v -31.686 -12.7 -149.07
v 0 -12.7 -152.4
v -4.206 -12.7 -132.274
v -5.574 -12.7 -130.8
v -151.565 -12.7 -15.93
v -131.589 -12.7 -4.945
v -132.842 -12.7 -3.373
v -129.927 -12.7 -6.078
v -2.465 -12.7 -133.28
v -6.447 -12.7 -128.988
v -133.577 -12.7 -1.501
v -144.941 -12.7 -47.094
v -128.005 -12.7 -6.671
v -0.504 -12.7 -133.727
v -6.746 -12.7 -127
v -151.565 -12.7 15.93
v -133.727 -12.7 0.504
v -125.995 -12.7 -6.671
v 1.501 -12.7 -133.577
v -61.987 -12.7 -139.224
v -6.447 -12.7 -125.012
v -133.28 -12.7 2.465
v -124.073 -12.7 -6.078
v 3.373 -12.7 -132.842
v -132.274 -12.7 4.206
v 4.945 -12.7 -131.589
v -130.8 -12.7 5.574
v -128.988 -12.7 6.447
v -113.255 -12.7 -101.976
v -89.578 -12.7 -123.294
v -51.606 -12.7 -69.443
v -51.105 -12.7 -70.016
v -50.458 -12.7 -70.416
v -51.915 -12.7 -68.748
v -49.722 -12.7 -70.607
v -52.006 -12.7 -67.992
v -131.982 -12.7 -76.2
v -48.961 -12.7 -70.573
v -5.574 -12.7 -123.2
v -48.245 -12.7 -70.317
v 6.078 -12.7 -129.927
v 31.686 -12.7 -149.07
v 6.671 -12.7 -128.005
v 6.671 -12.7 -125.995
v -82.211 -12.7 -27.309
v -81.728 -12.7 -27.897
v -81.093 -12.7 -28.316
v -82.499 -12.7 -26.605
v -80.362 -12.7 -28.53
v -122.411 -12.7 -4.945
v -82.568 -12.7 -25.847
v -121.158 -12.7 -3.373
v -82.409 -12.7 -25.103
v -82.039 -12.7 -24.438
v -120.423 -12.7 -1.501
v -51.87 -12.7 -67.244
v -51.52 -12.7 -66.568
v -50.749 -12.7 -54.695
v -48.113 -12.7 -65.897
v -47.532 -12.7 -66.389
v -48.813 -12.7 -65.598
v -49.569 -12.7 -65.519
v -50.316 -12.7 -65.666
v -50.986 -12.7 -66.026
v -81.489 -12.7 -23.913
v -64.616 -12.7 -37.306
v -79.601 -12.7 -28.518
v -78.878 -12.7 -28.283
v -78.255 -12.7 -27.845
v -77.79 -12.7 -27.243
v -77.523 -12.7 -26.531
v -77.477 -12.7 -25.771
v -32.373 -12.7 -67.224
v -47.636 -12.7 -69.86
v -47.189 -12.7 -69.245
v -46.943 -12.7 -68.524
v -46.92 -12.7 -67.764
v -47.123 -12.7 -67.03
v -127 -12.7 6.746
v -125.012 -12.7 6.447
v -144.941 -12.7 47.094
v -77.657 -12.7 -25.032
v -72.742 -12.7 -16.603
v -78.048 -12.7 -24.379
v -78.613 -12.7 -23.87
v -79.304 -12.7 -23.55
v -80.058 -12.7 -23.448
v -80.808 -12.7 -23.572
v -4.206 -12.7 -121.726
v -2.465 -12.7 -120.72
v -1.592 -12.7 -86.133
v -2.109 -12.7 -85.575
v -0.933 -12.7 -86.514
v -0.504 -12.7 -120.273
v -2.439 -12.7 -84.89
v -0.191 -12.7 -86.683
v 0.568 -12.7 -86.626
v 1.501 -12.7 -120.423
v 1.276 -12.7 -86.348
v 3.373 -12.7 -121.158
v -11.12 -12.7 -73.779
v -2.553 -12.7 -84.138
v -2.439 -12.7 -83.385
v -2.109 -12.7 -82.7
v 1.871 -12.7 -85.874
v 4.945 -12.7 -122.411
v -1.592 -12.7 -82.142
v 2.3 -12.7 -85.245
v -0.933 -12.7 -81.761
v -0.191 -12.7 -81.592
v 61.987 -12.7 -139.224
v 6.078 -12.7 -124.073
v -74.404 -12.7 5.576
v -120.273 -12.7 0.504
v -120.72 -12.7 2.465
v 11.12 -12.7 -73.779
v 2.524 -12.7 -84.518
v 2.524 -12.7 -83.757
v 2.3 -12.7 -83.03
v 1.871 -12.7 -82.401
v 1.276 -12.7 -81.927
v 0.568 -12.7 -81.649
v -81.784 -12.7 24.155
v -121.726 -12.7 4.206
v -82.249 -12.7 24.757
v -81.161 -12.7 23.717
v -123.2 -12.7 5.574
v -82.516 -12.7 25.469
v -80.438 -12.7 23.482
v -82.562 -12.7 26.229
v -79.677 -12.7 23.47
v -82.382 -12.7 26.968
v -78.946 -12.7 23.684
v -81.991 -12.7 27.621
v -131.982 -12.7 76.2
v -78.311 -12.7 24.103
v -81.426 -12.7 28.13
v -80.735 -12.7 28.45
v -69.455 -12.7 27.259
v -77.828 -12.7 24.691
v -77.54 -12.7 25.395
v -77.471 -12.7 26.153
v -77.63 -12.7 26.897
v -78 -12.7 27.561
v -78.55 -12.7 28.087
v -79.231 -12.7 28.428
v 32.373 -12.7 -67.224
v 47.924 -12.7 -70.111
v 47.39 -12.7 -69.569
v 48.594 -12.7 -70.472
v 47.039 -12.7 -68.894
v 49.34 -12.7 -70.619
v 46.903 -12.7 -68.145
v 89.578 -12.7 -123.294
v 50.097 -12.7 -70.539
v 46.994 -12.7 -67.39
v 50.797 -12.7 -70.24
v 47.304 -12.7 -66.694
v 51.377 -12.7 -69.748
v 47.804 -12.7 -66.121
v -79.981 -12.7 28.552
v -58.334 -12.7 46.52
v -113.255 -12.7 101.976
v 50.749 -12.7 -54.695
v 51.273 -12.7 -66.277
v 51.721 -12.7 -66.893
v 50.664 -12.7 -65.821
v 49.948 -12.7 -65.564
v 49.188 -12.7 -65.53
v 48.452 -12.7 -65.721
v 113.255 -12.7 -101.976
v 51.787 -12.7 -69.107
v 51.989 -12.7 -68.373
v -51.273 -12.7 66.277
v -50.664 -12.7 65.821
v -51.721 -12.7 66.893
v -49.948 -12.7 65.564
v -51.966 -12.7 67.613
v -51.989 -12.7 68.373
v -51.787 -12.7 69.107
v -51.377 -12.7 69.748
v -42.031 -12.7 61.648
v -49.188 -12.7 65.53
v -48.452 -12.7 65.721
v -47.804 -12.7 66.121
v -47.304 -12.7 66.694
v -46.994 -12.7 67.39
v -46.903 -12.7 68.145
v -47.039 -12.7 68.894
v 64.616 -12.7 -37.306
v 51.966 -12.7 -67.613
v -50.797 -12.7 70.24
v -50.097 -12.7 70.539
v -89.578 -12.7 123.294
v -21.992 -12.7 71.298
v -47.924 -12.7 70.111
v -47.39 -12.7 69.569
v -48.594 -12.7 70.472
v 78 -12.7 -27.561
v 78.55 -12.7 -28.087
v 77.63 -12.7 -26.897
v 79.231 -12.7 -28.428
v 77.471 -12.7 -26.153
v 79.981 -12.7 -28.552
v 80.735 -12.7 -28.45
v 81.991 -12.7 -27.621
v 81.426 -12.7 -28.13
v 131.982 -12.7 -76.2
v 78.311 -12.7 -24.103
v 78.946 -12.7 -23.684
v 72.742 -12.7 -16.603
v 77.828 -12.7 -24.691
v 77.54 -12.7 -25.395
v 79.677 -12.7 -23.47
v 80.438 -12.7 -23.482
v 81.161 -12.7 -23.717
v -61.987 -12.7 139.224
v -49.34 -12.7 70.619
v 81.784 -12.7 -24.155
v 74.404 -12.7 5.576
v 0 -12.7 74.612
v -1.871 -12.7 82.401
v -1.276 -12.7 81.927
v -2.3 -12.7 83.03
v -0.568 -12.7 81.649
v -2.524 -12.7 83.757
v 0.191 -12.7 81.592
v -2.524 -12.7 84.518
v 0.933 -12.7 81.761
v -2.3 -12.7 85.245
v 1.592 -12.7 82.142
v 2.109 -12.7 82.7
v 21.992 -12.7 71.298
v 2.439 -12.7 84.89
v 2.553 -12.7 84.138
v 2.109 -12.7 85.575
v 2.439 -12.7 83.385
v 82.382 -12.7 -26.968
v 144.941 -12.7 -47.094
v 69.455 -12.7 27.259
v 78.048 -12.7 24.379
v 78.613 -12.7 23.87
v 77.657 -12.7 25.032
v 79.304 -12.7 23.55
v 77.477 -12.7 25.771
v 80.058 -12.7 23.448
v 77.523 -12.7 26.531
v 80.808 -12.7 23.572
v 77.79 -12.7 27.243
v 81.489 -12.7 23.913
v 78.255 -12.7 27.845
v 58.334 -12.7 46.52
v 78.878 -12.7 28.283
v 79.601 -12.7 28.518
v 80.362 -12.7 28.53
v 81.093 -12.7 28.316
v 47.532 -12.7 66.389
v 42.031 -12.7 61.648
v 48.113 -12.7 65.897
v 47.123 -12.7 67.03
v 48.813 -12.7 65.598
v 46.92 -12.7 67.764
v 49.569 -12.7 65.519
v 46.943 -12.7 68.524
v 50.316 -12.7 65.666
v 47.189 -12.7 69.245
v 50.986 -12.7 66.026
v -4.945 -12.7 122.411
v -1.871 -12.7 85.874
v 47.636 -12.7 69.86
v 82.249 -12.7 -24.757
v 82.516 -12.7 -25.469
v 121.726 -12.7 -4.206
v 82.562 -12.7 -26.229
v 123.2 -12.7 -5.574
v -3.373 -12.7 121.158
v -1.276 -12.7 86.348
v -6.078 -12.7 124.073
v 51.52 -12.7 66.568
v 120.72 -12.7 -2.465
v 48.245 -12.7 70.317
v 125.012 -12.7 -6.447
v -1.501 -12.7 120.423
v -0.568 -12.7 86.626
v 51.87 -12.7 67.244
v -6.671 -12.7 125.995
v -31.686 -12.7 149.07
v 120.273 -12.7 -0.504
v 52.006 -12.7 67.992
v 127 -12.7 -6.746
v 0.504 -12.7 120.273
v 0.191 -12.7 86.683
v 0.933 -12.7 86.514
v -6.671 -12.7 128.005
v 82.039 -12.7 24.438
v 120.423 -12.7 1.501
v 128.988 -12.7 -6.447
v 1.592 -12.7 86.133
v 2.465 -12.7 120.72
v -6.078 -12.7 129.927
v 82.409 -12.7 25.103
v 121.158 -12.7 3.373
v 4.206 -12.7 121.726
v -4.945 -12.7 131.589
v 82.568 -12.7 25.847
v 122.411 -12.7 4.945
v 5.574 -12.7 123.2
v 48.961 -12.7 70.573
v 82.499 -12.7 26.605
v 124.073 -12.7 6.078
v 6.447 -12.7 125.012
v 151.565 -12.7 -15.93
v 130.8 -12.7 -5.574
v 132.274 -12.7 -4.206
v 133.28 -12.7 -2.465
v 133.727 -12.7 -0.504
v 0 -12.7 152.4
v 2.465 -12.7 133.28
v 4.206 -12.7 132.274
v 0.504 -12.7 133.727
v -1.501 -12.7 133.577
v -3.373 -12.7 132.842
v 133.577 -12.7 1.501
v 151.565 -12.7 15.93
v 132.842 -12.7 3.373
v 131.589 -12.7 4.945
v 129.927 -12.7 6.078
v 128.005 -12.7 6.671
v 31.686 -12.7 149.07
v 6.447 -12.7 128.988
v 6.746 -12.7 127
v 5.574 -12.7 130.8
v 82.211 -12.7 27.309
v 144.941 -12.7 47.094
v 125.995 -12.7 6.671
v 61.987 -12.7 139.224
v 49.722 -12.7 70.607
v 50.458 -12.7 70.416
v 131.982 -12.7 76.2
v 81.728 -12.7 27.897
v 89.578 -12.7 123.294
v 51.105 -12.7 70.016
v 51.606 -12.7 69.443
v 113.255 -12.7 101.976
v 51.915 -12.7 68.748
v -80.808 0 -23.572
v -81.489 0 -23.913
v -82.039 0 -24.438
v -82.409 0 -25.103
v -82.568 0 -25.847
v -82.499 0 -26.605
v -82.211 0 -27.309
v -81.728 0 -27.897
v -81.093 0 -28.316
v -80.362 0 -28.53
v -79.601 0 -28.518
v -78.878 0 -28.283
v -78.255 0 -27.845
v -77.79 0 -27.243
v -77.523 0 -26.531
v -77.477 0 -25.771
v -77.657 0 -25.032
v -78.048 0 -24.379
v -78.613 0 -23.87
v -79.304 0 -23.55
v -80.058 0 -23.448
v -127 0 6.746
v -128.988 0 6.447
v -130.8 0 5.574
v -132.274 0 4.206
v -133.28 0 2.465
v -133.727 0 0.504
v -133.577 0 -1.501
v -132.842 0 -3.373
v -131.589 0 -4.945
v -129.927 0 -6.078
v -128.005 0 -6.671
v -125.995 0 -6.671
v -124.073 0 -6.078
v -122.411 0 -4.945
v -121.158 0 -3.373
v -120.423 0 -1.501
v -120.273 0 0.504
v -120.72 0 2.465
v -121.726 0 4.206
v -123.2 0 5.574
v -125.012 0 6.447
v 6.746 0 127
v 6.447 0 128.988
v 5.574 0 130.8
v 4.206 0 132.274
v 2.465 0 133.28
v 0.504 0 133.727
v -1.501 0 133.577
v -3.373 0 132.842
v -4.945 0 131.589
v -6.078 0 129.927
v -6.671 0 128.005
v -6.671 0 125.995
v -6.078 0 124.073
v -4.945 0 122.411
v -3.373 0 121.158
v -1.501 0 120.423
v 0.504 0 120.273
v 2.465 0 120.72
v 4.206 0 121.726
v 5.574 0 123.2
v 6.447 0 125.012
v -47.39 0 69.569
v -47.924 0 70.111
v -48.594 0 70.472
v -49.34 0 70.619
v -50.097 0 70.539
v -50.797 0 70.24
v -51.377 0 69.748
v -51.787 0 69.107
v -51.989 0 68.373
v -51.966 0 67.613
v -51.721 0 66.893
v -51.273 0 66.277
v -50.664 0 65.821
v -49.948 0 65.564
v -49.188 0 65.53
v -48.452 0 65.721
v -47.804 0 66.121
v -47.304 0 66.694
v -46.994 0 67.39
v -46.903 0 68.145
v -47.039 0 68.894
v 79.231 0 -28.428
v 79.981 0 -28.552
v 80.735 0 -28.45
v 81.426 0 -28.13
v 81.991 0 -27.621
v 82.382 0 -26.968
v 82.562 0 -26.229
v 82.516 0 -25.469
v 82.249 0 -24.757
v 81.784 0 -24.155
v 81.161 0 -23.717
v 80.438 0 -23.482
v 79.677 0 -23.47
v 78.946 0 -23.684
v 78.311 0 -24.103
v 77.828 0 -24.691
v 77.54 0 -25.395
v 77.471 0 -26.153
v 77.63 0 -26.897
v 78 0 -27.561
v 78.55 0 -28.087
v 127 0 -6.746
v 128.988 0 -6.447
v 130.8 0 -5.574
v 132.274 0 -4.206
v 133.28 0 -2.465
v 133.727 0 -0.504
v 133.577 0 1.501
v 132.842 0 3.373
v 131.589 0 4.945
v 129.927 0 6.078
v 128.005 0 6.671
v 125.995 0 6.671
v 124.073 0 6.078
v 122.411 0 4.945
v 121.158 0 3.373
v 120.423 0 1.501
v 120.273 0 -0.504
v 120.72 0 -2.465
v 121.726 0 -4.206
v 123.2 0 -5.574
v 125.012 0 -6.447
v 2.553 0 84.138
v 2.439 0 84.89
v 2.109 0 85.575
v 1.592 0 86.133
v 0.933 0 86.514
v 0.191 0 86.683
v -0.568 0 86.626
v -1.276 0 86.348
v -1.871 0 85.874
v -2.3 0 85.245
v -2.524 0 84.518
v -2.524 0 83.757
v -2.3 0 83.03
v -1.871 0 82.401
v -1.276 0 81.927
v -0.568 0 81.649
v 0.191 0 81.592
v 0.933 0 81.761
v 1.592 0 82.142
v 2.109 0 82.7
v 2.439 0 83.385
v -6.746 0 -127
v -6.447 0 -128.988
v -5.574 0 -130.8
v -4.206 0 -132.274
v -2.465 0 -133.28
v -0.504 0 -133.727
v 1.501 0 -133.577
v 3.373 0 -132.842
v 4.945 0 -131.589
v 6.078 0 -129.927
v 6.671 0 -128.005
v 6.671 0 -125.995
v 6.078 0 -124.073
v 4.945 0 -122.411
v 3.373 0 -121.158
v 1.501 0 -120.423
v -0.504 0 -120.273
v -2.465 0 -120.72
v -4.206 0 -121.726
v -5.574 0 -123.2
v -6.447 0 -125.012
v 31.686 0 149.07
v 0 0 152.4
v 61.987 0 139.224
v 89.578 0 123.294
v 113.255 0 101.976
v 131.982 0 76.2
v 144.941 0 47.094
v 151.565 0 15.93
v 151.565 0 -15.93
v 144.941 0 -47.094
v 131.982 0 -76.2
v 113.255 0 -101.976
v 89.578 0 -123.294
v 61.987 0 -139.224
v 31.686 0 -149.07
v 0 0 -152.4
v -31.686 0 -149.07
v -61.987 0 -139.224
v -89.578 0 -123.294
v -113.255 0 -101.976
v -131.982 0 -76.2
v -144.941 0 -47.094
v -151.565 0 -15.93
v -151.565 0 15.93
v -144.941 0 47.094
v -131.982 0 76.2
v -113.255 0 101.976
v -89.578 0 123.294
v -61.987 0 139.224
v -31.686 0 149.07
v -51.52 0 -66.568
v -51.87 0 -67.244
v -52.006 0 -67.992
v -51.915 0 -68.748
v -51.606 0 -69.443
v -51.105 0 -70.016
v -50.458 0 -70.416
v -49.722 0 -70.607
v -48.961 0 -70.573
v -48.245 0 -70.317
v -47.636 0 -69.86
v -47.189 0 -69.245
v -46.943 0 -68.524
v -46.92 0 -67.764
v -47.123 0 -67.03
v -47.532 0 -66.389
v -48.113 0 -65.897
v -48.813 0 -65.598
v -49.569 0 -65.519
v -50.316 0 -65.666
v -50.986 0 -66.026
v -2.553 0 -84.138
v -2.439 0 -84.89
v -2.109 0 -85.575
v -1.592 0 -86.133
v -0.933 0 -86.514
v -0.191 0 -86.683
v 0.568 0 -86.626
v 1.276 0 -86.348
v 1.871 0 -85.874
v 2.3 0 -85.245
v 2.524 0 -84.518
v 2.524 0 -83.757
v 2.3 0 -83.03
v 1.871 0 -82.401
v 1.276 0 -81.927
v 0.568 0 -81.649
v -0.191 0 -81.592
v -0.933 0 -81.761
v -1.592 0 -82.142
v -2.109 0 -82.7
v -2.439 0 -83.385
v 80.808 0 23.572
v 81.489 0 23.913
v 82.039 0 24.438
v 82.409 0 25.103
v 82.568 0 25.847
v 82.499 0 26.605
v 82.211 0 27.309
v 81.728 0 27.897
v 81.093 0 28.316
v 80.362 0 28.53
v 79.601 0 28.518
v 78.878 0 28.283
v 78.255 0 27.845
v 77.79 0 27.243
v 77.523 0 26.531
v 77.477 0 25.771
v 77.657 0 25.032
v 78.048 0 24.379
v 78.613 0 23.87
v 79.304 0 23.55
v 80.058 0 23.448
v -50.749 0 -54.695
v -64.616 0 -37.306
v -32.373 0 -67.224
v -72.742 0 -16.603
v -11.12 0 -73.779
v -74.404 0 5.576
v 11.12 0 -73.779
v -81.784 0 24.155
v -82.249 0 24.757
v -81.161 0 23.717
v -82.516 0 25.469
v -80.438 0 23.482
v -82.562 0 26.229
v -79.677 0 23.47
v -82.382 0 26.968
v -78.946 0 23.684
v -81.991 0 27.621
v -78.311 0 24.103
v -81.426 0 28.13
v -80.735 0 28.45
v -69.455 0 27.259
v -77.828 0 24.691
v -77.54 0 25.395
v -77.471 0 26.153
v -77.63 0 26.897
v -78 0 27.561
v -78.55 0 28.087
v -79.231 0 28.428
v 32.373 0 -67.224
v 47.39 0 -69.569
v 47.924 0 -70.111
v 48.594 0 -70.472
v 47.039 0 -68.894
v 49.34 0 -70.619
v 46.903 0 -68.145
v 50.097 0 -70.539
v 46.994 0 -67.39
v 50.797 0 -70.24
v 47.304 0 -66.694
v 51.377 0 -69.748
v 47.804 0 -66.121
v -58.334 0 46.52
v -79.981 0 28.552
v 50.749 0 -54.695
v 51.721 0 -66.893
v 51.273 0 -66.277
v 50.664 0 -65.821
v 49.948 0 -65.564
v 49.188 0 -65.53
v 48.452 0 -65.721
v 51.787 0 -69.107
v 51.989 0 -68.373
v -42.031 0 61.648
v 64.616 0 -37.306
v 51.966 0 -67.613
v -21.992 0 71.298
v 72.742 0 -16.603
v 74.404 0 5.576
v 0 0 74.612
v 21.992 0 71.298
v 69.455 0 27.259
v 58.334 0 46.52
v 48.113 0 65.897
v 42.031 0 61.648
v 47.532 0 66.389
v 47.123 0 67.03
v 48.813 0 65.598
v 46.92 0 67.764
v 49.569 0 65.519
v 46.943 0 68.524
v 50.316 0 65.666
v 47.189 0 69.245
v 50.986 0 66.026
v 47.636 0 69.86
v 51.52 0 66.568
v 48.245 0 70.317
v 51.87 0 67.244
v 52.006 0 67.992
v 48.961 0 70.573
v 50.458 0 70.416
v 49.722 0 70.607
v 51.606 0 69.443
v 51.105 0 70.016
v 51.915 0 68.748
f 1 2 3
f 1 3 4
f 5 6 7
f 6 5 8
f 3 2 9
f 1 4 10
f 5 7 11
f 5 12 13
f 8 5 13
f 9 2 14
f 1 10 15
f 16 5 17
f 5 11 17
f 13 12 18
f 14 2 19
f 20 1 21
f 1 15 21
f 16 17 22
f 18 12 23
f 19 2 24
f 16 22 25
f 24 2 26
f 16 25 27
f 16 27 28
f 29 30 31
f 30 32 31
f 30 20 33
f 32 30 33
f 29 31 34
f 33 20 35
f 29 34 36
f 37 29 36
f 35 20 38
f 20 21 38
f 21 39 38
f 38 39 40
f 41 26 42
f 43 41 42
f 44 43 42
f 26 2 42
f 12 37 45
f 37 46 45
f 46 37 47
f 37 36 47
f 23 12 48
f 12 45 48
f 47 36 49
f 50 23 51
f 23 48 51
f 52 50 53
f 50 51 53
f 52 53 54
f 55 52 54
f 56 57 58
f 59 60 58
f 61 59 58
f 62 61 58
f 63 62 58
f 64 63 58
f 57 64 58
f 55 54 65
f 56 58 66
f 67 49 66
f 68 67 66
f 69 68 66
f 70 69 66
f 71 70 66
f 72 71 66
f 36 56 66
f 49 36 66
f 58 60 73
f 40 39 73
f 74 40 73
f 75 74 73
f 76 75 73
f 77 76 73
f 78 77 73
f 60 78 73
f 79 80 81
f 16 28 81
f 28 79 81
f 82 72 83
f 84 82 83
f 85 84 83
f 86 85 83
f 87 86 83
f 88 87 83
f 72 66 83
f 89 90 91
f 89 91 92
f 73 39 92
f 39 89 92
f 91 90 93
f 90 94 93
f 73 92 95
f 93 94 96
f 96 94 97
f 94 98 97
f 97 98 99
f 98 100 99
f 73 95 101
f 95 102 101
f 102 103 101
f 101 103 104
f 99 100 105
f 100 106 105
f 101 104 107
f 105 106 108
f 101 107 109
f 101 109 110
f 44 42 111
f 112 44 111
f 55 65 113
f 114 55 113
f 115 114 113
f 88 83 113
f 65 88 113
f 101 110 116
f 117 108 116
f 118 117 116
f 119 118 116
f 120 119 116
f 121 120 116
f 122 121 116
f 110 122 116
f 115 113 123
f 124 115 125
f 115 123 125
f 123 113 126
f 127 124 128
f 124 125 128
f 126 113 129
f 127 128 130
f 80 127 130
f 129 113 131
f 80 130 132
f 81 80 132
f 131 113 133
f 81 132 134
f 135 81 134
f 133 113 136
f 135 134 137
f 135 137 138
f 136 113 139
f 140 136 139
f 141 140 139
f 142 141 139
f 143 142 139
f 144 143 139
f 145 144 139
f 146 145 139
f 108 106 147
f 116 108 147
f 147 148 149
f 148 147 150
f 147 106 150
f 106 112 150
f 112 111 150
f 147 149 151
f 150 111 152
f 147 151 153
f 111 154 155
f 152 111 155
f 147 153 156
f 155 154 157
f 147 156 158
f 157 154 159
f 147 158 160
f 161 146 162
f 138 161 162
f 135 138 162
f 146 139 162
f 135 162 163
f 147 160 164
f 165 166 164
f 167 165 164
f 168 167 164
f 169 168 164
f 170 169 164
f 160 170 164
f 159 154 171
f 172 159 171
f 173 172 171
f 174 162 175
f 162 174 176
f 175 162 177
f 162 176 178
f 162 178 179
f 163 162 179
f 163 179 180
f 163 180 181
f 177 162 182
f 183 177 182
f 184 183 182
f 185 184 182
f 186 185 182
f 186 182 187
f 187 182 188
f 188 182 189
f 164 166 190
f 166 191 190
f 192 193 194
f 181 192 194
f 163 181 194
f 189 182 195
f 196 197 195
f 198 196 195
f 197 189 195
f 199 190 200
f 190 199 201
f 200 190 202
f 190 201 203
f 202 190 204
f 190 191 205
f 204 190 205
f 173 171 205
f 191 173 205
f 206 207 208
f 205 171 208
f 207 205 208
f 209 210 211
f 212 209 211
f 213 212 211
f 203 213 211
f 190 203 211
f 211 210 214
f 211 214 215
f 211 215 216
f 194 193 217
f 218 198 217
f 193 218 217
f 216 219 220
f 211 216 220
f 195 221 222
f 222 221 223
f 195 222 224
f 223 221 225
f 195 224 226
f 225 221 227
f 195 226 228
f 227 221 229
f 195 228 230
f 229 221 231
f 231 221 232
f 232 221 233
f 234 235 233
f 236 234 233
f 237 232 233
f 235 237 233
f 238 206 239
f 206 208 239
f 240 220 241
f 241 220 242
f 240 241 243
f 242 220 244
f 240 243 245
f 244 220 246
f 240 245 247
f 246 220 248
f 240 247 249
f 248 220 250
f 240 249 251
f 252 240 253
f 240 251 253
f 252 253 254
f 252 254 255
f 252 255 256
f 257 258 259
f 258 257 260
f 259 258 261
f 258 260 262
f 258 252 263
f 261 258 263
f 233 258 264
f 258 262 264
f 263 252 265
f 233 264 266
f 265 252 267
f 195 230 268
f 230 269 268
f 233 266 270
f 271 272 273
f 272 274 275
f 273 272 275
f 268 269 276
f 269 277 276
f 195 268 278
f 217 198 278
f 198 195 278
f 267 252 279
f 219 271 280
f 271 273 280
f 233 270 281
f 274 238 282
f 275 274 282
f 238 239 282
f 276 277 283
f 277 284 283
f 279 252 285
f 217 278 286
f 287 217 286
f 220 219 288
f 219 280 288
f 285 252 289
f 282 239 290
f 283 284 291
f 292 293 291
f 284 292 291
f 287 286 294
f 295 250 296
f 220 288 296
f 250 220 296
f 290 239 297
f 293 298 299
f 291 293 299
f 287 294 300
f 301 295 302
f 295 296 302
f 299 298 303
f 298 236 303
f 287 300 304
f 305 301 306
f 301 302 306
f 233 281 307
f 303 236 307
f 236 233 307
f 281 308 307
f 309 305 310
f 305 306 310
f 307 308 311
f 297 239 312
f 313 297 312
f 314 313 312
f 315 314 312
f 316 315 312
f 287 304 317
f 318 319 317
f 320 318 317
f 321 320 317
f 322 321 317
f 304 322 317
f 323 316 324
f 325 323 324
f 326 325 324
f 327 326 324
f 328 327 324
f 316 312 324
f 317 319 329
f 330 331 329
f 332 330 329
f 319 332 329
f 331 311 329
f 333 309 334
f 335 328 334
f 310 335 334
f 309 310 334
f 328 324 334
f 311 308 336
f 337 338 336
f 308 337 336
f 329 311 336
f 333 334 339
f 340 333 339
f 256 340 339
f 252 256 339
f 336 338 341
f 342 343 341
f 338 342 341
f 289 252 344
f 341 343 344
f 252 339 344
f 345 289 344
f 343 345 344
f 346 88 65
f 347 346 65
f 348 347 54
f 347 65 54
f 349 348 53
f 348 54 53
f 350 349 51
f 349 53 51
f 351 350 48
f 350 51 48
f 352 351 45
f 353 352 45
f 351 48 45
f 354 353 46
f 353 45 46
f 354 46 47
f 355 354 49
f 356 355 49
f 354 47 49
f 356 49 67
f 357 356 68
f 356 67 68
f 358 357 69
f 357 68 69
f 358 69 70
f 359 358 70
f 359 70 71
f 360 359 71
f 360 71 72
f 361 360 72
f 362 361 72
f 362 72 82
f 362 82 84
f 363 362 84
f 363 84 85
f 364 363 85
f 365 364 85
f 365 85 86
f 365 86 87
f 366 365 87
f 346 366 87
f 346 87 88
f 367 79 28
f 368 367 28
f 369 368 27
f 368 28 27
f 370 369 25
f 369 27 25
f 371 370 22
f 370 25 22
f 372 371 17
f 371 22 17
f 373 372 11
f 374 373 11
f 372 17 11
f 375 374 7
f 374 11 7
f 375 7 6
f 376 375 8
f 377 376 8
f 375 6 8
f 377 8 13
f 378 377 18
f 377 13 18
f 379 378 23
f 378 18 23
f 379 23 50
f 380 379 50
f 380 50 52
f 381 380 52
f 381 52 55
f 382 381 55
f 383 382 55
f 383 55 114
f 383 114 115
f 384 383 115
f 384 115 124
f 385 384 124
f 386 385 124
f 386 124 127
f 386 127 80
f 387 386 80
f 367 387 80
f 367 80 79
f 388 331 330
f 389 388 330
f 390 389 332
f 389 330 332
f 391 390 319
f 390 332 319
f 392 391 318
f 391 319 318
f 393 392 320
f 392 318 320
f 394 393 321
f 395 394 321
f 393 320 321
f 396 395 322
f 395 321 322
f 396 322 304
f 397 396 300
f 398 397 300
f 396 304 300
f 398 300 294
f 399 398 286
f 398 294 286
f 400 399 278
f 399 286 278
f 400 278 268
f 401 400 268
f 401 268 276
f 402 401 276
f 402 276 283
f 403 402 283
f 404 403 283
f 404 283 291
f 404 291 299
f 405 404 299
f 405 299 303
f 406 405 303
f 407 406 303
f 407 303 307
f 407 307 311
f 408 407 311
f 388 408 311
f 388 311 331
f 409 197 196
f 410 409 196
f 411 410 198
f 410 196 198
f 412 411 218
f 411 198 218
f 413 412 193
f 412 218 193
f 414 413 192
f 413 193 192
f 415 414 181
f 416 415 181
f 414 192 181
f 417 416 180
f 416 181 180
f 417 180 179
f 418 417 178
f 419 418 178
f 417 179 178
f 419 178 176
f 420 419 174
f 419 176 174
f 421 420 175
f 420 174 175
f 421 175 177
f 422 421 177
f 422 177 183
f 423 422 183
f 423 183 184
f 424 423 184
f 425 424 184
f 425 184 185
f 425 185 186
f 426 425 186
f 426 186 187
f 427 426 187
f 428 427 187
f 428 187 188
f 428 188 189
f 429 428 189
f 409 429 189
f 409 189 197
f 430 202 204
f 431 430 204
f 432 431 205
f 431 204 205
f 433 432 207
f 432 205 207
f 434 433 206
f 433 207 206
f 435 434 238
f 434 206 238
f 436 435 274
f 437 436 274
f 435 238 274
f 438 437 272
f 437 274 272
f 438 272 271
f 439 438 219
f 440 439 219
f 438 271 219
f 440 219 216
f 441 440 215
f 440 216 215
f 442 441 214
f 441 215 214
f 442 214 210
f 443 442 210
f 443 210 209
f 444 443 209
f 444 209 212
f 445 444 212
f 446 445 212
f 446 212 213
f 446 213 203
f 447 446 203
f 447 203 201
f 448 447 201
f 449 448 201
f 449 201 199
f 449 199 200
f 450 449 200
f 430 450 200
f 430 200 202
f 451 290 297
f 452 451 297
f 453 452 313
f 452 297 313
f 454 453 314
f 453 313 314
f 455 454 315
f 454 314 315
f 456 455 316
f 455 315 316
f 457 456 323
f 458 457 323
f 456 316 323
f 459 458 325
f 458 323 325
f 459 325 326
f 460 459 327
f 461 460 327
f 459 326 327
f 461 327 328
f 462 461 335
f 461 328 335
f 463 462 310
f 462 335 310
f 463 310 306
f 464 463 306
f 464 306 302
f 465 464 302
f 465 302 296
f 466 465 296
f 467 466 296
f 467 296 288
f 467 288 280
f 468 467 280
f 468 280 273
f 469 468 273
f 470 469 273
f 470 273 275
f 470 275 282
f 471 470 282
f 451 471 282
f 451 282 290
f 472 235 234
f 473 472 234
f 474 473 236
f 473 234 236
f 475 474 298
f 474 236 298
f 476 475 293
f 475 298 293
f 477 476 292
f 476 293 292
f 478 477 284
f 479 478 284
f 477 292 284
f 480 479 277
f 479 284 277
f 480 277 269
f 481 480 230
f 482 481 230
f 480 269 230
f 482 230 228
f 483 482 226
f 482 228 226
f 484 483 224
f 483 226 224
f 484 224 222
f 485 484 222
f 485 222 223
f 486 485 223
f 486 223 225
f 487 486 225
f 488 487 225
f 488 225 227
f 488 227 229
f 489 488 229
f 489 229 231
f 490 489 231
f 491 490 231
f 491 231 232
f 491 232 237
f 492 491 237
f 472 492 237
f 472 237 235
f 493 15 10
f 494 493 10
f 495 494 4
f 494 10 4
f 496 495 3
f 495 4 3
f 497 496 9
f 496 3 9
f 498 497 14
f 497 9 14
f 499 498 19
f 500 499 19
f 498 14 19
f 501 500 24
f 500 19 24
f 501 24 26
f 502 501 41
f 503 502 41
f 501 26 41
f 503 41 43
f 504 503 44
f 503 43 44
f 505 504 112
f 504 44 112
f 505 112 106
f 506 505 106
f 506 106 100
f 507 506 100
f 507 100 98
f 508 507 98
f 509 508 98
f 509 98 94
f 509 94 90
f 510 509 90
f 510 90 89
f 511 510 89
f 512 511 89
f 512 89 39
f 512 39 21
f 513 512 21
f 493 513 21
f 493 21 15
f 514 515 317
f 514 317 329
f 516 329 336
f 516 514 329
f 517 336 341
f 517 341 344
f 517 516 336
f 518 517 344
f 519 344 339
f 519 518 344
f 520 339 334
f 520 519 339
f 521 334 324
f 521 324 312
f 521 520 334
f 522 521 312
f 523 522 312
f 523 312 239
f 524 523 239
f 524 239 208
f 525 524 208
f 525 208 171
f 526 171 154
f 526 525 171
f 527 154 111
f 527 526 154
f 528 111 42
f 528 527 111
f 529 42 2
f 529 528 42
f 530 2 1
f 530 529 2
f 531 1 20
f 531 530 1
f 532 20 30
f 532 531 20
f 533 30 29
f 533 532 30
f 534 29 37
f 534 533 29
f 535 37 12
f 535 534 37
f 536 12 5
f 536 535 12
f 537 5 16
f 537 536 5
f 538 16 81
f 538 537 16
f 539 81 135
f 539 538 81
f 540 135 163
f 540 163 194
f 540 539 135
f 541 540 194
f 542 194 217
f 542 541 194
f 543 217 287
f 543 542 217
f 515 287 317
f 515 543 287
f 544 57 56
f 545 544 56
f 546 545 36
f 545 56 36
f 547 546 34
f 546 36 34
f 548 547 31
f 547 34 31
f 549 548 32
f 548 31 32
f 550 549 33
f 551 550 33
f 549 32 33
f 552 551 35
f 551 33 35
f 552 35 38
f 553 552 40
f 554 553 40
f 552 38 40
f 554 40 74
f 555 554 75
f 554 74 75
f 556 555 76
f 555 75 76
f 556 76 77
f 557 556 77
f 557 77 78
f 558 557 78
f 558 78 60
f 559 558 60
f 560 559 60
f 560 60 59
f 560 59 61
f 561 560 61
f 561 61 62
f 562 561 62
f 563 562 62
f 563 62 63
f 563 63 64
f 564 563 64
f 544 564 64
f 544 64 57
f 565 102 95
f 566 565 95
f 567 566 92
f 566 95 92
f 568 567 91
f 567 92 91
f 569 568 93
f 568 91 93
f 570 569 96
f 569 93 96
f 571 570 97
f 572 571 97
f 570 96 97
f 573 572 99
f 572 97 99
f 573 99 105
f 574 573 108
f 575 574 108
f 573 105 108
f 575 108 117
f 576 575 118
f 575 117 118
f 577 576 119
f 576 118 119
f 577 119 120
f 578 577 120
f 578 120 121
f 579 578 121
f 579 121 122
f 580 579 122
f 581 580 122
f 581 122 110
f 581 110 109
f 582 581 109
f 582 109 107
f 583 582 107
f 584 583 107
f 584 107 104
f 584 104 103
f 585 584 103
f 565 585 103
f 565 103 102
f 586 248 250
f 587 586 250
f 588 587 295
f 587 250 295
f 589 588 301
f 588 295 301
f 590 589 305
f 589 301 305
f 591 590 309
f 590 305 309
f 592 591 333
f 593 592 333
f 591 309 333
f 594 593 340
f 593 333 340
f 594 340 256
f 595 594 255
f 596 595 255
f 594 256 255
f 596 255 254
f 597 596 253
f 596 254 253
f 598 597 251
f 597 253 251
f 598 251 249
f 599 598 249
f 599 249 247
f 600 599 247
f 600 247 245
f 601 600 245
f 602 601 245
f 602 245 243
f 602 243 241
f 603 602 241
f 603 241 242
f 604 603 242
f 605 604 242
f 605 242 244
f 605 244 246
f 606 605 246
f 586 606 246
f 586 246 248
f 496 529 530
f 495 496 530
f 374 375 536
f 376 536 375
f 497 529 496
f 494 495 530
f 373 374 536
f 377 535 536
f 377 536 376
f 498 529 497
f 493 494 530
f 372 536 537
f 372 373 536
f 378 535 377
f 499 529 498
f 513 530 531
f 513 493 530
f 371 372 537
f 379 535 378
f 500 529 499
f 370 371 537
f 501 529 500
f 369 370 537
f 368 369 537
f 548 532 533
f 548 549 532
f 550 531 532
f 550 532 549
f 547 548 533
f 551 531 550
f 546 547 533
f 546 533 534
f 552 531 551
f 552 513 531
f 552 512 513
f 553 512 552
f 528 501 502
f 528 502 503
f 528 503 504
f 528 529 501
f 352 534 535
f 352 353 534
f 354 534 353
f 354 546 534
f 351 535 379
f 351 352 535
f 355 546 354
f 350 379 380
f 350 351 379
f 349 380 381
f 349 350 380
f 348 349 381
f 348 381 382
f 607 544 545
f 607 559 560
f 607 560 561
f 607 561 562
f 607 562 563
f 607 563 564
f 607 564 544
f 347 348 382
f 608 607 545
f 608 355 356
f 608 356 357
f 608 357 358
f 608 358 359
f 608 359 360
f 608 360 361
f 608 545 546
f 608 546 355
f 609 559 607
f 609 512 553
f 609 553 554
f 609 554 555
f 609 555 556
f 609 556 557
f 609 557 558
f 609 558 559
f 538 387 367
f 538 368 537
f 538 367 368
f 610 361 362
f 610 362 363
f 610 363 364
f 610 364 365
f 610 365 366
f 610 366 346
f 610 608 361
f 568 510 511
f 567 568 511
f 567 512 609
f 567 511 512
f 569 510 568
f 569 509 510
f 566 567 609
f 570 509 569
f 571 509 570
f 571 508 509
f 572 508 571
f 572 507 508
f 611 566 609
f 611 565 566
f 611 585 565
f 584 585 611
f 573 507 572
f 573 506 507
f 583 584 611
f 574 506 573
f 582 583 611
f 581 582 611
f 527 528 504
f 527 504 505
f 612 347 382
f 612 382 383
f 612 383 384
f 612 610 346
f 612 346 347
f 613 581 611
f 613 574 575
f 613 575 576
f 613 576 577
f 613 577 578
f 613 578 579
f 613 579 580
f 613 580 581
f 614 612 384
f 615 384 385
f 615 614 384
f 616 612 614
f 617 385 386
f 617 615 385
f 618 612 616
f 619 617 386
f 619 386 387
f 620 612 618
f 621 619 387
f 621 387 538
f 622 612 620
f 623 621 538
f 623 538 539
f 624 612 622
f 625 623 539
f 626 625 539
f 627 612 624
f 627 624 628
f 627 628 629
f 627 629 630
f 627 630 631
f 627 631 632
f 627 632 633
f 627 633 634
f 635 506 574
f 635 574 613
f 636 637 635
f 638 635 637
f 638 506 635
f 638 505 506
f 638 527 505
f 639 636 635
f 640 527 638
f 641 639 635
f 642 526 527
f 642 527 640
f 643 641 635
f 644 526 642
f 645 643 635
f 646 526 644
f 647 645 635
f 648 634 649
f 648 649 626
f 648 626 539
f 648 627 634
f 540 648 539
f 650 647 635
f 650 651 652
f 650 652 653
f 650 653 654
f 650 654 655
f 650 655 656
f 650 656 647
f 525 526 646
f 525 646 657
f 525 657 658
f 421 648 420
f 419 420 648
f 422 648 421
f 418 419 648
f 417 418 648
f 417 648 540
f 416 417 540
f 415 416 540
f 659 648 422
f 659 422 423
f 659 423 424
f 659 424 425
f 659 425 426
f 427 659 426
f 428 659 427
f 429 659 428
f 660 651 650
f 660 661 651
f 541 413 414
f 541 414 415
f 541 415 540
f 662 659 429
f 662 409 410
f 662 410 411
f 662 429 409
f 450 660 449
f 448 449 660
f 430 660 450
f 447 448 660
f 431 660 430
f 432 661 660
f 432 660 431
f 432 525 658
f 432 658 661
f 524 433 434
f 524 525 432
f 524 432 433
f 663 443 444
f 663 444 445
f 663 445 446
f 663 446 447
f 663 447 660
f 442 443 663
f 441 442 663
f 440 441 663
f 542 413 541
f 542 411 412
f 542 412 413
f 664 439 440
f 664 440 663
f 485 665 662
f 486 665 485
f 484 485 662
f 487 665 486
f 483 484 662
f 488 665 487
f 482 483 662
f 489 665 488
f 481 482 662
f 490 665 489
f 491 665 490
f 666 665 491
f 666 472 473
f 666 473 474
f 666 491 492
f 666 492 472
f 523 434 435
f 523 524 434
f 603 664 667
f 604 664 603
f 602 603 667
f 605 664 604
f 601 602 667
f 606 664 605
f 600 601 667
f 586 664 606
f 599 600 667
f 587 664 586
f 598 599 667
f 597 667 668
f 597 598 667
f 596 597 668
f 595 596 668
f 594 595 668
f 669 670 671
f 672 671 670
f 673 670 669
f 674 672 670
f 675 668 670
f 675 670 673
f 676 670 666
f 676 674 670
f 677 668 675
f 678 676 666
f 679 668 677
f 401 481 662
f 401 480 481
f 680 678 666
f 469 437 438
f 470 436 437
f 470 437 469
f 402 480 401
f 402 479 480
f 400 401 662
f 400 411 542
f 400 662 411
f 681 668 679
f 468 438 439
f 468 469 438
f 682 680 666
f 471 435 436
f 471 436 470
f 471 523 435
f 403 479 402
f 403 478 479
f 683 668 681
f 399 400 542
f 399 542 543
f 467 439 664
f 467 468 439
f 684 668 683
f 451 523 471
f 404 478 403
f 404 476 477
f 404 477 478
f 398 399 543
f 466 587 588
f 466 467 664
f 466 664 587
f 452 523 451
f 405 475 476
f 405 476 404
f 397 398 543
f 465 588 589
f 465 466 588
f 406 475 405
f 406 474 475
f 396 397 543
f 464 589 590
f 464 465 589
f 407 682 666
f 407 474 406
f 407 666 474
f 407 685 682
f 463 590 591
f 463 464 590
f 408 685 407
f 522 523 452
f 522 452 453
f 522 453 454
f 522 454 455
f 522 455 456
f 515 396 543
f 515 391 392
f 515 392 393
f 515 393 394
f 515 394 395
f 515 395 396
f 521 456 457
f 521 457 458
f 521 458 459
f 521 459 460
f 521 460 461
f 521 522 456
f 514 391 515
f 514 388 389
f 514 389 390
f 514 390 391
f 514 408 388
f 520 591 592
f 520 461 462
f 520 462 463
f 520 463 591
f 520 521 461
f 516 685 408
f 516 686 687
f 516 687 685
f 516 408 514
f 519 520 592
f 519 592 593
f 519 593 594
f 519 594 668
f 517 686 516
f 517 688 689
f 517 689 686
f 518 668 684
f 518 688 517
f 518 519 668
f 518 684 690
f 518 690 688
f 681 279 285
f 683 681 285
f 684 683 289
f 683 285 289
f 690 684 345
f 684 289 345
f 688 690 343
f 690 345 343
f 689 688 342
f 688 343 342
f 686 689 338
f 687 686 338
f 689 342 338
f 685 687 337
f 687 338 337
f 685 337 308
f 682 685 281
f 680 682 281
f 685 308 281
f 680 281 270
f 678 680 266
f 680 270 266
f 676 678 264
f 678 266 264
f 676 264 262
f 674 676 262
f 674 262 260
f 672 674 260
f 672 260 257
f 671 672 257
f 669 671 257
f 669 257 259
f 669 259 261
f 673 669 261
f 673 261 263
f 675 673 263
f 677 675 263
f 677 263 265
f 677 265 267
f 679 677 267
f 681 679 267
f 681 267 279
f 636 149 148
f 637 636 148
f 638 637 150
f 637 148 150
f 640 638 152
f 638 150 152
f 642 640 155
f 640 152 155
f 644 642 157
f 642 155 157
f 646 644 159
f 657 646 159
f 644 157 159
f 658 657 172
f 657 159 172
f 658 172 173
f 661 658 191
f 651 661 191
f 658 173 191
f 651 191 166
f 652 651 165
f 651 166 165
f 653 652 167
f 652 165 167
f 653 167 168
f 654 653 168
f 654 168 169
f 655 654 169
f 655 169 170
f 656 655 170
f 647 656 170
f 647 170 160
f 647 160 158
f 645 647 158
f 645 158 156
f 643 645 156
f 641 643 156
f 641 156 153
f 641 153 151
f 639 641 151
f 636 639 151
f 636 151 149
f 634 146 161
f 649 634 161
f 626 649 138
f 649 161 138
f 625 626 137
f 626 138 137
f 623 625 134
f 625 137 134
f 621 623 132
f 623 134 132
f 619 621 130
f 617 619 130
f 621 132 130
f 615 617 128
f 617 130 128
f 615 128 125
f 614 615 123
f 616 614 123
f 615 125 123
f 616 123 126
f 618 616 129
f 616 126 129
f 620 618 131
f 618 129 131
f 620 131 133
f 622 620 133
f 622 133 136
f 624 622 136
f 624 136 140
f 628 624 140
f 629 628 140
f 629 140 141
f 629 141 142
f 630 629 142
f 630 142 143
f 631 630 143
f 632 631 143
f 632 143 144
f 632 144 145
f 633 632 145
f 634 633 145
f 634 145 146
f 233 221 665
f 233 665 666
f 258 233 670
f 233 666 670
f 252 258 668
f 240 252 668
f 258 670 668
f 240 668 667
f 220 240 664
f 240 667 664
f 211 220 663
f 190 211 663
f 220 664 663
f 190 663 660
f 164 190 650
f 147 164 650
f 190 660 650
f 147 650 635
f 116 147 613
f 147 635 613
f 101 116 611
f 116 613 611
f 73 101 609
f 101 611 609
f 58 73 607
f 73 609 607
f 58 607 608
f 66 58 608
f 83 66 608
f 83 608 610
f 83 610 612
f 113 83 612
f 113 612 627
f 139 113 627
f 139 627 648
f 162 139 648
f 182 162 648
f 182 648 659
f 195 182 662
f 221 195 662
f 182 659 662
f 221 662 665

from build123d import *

# Parameters (mm, degrees)
SKETCH1_R                           = 152.4
SKETCH1_R_2                         = 74.6125
THRUSTPLATE_TC3_DEPTH               = 12.7
UNDEF_CLEARANCE_THRUSTPLATE_D       = 13.49248
CLEARANCE_THRUSTPLATE_PATTERN_COUNT = 4
F_10_CLEARANCE_HOLE1_D              = 5.1054
CIRPATTERN1_COUNT                   = 10


with BuildPart() as part:
    # Sketch1 → ThrustPlate_TC3 (new body)
    with BuildSketch(Plane(origin=(0, 0, 0), x_dir=(1, 0, 0), z_dir=(0, 1, 0))):
        with Locations(Location((0, 0, 0), (0, 0, 270))):
            Circle(SKETCH1_R)
        with Locations(Location((0, 0, 0), (0, 0, 270))):
            Circle(SKETCH1_R_2, mode=Mode.SUBTRACT)
    extrude(amount=-THRUSTPLATE_TC3_DEPTH)

    # UNDEF_Clearance_ThrustPlate (through all)
    with Locations(Plane(origin=(0, 0, 0), x_dir=(1, 0, 0), z_dir=(0, 1, 0))):
        with Locations((0, 127)):
            undef_clearance_thrustplate = Hole(UNDEF_CLEARANCE_THRUSTPLATE_D / 2)

    # Clearance_ThrustPlate_Pattern: UNDEF_Clearance_ThrustPlate ×4 about axis
    clearance_thrustplate_pattern_axis = Axis((0, 0, 0), (0, 1, 0))
    for i in range(1, CLEARANCE_THRUSTPLATE_PATTERN_COUNT):
        add(undef_clearance_thrustplate.rotate(clearance_thrustplate_pattern_axis, i * 360 / CLEARANCE_THRUSTPLATE_PATTERN_COUNT), mode=Mode.SUBTRACT)

    # #10 Clearance Hole1 (through all)
    with Locations(Plane(origin=(0, 0, 0), x_dir=(1, 0, 0), z_dir=(0, 1, 0))):
        with Locations((0, 84.1375)):
            f_10_clearance_hole1 = Hole(F_10_CLEARANCE_HOLE1_D / 2)

    # CirPattern1: #10 Clearance Hole1 ×10 about axis
    cirpattern1_axis = Axis((0, 0, 0), (0, 1, 0))
    for i in range(1, CIRPATTERN1_COUNT):
        add(f_10_clearance_hole1.rotate(cirpattern1_axis, i * 360 / CIRPATTERN1_COUNT), mode=Mode.SUBTRACT)


solid = part.part
